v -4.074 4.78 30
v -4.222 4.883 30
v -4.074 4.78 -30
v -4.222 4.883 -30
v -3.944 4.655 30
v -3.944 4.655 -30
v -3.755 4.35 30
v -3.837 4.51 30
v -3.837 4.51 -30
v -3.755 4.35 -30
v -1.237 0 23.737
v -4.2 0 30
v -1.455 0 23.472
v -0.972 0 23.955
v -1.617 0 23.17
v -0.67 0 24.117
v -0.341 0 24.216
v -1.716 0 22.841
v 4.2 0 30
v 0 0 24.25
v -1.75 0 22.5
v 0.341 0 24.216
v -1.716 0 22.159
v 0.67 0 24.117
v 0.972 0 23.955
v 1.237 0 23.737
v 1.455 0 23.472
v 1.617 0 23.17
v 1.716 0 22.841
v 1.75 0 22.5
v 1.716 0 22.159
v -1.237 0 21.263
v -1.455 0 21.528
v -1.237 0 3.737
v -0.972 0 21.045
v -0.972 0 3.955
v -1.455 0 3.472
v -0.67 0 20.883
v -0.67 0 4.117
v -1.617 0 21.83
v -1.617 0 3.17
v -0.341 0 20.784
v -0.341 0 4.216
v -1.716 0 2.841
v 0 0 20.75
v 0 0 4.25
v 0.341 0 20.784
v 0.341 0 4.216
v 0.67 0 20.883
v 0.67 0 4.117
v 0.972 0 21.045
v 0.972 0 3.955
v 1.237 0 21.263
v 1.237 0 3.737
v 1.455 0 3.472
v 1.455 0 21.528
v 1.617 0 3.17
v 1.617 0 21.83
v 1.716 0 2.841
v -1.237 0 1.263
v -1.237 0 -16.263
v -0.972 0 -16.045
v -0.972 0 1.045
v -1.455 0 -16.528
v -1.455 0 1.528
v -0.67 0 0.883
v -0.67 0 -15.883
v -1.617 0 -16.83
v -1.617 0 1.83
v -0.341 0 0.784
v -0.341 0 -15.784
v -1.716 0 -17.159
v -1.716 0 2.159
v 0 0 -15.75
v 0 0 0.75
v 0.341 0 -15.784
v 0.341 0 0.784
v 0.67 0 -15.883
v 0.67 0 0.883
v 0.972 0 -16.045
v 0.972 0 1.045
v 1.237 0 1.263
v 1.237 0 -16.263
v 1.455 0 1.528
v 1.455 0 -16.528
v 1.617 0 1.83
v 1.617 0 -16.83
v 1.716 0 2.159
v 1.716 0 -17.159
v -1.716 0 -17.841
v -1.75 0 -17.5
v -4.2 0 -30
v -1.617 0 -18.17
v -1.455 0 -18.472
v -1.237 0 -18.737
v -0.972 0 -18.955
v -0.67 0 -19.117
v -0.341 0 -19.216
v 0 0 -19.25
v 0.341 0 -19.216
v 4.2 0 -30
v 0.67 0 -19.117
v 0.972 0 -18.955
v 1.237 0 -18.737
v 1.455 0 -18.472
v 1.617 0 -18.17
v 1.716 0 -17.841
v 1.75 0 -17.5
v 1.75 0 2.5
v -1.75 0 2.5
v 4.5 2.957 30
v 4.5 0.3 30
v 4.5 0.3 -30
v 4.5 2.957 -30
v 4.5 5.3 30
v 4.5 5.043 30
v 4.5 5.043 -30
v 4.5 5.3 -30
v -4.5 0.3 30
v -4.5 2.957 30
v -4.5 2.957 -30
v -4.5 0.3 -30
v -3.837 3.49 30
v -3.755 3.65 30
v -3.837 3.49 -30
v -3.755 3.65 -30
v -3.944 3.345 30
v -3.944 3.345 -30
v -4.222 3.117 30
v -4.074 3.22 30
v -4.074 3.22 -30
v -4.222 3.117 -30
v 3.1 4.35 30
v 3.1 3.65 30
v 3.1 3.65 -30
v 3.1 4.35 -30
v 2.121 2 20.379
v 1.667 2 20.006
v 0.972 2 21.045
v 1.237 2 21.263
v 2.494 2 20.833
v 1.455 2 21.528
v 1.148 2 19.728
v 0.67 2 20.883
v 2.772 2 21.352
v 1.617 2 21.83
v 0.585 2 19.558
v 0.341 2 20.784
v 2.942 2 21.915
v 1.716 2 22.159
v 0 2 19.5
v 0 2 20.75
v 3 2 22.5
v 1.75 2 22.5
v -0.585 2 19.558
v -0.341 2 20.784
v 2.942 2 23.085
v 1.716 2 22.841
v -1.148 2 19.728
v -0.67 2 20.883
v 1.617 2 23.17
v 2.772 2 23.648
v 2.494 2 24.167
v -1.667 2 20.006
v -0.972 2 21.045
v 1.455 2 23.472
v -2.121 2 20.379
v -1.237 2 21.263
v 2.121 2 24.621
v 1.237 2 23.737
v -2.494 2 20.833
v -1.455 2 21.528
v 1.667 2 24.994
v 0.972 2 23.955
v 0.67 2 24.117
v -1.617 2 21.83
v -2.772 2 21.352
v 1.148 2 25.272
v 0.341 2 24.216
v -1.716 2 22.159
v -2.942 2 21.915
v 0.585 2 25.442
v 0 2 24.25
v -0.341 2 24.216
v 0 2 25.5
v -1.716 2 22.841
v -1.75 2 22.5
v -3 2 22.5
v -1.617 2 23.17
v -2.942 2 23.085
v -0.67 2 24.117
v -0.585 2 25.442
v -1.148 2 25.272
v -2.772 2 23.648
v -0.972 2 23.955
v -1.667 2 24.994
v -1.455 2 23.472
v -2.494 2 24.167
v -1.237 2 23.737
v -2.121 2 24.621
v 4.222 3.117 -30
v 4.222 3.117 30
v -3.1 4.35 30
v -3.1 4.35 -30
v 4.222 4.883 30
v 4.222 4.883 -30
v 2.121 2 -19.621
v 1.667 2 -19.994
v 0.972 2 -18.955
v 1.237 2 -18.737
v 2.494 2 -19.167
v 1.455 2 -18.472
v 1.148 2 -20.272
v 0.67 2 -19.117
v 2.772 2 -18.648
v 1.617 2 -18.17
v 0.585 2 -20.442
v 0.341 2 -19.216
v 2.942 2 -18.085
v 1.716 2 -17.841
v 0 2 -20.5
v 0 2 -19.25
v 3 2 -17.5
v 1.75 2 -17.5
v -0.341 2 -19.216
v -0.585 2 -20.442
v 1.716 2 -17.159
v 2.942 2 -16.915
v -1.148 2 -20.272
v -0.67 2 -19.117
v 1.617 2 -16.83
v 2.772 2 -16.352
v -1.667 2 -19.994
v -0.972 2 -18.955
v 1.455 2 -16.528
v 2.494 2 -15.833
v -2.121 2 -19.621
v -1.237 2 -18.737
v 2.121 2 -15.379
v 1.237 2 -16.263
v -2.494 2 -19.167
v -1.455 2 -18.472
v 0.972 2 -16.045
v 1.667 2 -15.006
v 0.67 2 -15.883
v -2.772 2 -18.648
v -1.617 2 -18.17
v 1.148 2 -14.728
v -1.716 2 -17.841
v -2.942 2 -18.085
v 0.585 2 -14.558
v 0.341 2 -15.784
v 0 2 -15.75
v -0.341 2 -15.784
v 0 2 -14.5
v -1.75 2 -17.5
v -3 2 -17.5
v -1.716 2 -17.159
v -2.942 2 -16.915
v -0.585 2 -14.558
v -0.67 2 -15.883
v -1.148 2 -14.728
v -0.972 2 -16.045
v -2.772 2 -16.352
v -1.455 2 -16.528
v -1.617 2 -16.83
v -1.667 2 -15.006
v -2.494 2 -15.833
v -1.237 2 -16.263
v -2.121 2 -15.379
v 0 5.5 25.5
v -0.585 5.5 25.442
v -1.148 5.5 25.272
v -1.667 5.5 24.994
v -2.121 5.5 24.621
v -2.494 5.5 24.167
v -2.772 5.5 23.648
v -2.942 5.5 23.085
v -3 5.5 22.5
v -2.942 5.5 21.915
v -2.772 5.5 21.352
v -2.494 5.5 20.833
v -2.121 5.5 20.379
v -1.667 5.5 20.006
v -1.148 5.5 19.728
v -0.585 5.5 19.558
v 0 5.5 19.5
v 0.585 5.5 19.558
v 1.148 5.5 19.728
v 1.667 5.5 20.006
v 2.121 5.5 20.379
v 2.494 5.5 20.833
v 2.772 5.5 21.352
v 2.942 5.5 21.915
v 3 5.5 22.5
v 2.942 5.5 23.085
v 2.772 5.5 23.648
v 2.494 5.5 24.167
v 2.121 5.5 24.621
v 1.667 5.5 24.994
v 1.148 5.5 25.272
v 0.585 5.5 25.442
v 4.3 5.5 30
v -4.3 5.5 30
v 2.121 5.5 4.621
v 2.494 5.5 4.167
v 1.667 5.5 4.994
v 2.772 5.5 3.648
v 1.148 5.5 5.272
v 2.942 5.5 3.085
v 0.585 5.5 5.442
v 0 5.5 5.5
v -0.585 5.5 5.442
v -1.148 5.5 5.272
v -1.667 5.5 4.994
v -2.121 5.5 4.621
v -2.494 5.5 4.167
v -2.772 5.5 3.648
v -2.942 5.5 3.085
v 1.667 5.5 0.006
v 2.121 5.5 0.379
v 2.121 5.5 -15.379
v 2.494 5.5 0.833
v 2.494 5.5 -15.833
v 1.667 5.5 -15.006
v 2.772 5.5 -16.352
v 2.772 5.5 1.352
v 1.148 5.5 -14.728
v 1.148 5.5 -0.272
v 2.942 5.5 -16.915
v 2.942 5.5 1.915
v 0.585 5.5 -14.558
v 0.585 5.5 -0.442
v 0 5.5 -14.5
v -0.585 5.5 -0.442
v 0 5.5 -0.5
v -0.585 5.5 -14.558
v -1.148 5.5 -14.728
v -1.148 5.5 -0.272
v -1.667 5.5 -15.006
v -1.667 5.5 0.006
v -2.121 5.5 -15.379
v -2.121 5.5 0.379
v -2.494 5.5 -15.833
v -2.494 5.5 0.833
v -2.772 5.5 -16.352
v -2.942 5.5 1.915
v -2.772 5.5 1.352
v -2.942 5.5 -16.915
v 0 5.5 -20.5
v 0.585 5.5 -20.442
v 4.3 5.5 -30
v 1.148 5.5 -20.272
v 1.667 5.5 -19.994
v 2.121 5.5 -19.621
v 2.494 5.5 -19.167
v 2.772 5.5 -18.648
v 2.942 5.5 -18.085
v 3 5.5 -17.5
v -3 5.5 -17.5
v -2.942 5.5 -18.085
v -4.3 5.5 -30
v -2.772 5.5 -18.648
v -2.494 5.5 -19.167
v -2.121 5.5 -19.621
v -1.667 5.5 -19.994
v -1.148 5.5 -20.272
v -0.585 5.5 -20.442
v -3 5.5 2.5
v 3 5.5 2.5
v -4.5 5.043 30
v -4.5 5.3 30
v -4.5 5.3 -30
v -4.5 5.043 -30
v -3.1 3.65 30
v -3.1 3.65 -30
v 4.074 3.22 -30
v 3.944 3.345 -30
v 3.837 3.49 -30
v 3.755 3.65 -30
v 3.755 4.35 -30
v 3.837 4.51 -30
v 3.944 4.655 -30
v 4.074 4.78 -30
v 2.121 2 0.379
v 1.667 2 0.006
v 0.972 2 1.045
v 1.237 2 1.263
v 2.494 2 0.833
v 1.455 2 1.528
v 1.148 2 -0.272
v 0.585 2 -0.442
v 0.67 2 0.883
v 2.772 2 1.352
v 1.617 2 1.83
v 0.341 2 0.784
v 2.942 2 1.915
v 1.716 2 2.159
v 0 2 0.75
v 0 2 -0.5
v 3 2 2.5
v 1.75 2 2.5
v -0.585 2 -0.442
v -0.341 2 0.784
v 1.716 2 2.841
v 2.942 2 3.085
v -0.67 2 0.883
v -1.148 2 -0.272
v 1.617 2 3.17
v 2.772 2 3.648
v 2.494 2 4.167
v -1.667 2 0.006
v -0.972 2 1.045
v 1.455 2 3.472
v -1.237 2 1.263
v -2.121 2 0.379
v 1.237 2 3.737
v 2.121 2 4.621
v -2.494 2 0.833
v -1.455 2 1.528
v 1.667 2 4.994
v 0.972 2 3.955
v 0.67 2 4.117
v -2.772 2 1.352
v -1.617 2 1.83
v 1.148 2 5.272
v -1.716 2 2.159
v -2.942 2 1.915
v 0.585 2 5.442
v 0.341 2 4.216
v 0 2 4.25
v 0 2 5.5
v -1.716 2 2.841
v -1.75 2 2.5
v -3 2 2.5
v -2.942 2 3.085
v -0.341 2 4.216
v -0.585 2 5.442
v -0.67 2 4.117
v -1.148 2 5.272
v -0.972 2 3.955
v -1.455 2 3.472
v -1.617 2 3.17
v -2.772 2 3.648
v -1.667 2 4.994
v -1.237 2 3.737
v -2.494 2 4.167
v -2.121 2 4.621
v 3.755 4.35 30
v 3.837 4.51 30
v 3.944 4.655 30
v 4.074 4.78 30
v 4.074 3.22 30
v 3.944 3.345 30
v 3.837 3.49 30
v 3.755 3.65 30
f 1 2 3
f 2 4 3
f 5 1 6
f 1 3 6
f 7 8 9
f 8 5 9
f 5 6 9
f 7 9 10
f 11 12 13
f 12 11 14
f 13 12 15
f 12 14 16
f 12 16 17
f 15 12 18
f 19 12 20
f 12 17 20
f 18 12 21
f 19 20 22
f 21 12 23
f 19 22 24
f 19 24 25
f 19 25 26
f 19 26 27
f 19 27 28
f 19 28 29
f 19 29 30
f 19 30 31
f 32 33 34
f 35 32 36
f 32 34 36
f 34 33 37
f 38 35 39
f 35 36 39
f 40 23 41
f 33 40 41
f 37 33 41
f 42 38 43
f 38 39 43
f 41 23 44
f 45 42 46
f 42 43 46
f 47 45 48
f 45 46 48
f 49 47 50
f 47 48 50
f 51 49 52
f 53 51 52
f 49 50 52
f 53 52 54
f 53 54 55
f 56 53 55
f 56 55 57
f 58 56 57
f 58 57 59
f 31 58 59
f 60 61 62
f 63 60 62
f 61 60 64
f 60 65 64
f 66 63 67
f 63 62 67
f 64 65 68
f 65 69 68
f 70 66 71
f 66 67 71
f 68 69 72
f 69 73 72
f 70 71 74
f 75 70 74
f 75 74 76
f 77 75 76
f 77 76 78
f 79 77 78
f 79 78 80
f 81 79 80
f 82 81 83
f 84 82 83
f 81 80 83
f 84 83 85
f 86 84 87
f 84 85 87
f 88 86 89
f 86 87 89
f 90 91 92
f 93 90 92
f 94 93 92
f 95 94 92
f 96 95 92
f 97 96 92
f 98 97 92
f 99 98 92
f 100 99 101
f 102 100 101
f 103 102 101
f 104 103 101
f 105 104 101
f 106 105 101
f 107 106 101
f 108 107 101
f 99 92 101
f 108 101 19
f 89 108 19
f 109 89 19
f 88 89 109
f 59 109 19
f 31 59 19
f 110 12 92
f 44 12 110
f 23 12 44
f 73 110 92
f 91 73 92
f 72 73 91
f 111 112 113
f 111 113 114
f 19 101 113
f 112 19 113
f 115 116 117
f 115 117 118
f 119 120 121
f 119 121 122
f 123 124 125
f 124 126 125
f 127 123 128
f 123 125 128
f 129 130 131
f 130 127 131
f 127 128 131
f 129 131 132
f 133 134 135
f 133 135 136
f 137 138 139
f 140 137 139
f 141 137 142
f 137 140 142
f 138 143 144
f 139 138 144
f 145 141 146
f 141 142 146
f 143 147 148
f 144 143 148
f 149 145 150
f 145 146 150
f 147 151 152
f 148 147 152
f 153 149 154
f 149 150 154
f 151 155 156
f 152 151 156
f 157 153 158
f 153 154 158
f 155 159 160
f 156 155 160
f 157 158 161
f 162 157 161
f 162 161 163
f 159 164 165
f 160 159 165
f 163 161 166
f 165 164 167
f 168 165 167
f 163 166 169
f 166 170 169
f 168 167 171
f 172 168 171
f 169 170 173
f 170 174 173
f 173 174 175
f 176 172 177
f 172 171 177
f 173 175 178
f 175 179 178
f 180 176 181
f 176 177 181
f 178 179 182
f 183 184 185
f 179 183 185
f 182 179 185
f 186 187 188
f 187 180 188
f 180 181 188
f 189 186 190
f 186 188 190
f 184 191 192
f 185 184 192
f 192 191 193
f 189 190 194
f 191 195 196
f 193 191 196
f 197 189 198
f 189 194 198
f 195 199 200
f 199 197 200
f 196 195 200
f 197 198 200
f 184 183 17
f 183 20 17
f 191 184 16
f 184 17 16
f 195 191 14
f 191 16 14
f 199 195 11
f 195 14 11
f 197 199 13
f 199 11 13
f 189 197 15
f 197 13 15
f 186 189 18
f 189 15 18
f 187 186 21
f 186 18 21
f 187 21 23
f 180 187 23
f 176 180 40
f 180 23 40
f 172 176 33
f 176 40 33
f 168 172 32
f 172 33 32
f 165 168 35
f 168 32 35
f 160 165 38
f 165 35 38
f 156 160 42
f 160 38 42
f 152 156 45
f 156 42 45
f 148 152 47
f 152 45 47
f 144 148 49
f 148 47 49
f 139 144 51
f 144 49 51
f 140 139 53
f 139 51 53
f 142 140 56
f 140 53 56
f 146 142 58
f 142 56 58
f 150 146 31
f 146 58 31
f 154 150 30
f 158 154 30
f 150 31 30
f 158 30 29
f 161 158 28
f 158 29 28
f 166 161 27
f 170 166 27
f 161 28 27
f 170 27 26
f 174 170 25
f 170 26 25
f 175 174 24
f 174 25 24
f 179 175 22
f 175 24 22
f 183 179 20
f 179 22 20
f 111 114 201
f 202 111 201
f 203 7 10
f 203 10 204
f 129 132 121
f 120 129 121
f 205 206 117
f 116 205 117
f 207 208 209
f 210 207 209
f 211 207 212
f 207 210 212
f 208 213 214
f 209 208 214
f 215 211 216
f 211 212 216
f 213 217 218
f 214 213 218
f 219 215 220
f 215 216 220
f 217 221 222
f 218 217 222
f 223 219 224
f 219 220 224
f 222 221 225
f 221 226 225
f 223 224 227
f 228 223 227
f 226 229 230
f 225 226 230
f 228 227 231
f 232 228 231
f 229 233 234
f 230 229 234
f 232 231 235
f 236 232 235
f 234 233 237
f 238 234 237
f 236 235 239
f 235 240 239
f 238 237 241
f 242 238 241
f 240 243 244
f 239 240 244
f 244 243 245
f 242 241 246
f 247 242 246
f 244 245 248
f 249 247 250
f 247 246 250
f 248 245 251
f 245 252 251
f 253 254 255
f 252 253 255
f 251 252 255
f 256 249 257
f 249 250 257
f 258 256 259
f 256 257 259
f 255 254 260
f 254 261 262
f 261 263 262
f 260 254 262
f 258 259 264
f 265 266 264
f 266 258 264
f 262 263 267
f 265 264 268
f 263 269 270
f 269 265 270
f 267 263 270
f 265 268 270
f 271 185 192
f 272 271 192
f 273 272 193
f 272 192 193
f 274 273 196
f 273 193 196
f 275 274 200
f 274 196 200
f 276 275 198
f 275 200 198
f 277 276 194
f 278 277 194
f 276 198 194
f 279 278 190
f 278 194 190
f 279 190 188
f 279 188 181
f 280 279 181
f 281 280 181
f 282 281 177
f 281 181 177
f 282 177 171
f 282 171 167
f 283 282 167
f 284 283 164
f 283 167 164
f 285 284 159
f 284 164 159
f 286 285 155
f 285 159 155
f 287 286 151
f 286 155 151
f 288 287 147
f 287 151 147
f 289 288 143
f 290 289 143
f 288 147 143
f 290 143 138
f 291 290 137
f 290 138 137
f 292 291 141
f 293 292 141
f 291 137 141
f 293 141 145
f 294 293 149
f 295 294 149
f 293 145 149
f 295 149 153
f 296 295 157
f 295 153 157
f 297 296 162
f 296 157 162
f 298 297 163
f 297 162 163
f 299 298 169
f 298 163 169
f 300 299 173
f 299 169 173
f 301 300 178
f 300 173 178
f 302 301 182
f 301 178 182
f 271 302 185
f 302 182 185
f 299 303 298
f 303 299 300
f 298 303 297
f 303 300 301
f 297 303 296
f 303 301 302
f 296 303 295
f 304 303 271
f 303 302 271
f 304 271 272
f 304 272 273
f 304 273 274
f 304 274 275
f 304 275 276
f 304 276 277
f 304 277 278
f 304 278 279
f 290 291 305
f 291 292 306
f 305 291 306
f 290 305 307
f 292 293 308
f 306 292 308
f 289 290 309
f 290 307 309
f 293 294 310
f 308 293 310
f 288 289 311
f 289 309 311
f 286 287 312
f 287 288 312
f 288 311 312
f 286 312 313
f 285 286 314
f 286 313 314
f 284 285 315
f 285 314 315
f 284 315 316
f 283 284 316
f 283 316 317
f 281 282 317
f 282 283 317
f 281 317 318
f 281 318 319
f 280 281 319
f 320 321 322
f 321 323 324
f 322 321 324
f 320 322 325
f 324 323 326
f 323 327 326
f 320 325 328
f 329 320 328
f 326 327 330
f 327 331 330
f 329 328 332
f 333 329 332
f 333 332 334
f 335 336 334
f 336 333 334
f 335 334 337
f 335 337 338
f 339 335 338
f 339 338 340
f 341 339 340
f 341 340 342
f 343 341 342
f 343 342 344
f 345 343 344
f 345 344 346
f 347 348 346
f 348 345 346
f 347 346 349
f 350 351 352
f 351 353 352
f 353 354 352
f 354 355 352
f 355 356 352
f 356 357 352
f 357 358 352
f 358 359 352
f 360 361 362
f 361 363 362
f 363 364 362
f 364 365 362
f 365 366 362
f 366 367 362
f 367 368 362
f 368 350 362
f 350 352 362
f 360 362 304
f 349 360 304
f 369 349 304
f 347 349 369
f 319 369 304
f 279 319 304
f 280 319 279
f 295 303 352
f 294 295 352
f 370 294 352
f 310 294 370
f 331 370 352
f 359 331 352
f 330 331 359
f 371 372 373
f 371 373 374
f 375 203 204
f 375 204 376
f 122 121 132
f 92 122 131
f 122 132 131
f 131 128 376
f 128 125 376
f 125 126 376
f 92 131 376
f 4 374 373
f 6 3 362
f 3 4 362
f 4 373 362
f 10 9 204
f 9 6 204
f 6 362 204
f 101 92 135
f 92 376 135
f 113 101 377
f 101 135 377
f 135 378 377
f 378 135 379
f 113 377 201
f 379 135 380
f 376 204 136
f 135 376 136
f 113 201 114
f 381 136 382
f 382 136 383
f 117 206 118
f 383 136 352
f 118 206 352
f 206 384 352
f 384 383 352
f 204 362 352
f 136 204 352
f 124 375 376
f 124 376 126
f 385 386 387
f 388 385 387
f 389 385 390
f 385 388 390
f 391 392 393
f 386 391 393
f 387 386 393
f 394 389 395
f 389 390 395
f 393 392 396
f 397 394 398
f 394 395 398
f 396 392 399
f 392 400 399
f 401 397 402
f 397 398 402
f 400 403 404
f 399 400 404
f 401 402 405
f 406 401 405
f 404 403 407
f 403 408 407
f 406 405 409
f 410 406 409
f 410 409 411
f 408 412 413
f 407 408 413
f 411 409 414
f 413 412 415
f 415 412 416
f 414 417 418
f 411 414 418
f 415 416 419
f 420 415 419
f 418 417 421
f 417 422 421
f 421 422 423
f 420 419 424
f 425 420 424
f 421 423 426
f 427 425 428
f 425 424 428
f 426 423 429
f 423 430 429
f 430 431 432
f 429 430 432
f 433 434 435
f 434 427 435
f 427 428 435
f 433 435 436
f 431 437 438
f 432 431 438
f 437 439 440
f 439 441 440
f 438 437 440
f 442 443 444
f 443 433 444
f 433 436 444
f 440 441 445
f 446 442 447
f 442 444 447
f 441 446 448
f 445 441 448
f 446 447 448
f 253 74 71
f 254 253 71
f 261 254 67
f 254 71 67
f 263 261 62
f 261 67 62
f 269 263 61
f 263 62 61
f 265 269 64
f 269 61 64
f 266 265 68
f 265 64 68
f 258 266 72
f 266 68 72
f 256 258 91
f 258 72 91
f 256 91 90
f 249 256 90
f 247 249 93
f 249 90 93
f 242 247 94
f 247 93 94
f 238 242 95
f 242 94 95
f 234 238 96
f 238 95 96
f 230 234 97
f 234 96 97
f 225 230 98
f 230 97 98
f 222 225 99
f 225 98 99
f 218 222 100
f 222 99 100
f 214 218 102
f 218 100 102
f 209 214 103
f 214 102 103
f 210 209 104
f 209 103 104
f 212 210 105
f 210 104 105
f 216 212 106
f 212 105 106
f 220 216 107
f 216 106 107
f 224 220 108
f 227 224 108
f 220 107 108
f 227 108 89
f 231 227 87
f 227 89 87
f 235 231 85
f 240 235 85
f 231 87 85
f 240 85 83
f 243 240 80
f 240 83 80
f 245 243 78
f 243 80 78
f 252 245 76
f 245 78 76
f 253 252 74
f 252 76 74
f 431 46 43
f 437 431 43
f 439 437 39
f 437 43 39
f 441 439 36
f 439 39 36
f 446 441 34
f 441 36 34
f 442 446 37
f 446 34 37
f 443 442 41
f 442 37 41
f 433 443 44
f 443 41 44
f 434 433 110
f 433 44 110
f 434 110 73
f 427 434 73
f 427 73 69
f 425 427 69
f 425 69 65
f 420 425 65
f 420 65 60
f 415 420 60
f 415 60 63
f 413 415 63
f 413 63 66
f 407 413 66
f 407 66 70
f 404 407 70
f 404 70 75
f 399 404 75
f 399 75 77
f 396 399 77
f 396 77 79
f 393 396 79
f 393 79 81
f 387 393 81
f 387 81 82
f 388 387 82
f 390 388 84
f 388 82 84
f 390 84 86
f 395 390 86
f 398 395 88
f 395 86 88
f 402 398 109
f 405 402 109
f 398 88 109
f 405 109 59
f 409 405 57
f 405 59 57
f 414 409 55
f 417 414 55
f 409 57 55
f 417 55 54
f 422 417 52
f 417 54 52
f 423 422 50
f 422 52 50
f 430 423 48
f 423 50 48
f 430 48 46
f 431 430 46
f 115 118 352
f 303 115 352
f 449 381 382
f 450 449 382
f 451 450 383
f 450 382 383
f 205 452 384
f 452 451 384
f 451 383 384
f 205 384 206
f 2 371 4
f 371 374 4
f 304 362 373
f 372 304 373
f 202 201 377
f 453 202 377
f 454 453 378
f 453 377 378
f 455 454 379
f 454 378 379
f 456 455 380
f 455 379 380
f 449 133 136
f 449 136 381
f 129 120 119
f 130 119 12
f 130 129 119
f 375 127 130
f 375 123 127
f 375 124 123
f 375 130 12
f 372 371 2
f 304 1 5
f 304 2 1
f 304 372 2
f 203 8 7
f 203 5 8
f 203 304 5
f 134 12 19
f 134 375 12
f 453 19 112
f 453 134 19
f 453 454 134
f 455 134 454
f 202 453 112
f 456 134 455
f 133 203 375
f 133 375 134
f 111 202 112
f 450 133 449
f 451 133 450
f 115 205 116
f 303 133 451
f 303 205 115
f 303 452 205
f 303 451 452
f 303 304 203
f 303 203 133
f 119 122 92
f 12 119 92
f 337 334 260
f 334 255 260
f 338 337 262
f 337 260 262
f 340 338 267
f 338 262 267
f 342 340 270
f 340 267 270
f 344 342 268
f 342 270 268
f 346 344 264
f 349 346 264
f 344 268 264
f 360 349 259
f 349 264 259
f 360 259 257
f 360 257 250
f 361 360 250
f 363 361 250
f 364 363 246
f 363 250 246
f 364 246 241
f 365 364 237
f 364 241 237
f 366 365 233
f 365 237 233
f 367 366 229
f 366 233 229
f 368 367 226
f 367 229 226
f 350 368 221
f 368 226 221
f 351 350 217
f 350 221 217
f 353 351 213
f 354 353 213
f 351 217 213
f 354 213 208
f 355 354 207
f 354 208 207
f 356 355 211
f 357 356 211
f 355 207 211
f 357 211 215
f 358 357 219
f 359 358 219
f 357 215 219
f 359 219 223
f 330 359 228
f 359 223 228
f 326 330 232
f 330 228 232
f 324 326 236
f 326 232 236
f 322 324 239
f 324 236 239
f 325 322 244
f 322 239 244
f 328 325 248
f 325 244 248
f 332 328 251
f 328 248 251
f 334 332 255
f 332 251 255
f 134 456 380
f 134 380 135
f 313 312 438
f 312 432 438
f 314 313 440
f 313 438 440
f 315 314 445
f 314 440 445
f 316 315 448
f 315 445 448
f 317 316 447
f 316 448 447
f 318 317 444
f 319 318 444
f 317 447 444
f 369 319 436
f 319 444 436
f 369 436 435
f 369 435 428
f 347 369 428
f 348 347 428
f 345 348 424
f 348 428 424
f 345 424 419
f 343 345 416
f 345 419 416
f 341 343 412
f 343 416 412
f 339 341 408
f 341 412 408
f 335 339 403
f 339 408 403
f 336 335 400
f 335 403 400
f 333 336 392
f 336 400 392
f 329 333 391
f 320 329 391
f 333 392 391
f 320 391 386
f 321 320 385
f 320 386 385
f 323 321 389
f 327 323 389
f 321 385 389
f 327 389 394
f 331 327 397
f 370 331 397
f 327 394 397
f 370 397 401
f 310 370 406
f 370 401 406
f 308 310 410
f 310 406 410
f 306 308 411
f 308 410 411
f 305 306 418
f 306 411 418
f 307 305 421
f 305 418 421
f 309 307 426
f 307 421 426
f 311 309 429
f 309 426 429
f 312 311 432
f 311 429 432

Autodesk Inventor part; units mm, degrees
sketch "Sketch_12" plane through (0, 0, 0) normal (0, 0, 1) x (1, 0, 0)
  line L0 (-4.5, 5.3) -> (-4.5, 5.0434)
  line L1 (-4.5, 5.0434) -> (-4.2216, 4.8827)
  arc A0 (-3.7548, 4.35) -> (-4.2216, 4.8827) centre (-4.7715, 3.93) ccw
  line L2 (-3.7548, 4.35) -> (-3.1, 4.35)
  line L3 (-3.1, 4.35) -> (-3.1, 3.65)
  line L4 (-3.1, 3.65) -> (-3.7548, 3.65)
  arc A1 (-4.2216, 3.1173) -> (-3.7548, 3.65) centre (-4.7715, 4.07) ccw
  line L5 (-4.2216, 3.1173) -> (-4.5, 2.9566)
  line L6 (-4.5, 2.9566) -> (-4.5, 0.3)
  line L7 (-4.5, 0.3) -> (-4.2, 0)
  line L8 (-4.2, 0) -> (4.2, 0)
  line L9 (4.2, 0) -> (4.5, 0.3)
  line L10 (4.5, 0.3) -> (4.5, 2.9566)
  line L11 (4.5, 2.9566) -> (4.2216, 3.1173)
  arc A2 (3.7548, 3.65) -> (4.2216, 3.1173) centre (4.7715, 4.07) ccw
  line L12 (3.7548, 3.65) -> (3.1, 3.65)
  line L13 (3.1, 3.65) -> (3.1, 4.35)
  line L14 (3.1, 4.35) -> (3.7548, 4.35)
  arc A3 (4.2216, 4.8827) -> (3.7548, 4.35) centre (4.7715, 3.93) ccw
  line L15 (4.2216, 4.8827) -> (4.5, 5.0434)
  line L16 (4.5, 5.0434) -> (4.5, 5.3)
  line L17 (4.5, 5.3) -> (4.3, 5.5)
  line L18 (4.3, 5.5) -> (-4.3, 5.5)
  line L19 (-4.3, 5.5) -> (-4.5, 5.3)
extrude "Extrusion1" add sketch "Sketch_12" along normal mid plane 60
sketch "Sketch2" plane through (-4.3, 5.5, 30) normal (0, 1, 0) x (1, 0, 0)
  point P0 (4.3, 447.5)
hole "Hole1" at (0, 5.5, -417.5) direction (0, -1, 0) diameter 3.5 depth 5.5 counterbore diameter 6 counterbore depth 3.5
pattern_linear "Rectangular Pattern1" count 23 spacing 20 along (0, 0, 1) of "Hole1"
ref_plane "rail_to_adjusting_block_XY" through (0, 0, -220) normal (0, 1, 0) x (1, 0, 0)
ref_plane "rail_to_adjusting_block_YZ" through (0, 0, -220) normal (1, 0, 0) x (0, 0, -1)
ref_plane "rail_to_adjusting_block_ZX" through (0, 0, -220) normal (0, 0, -1) x (0, 1, 0)
ref_plane "to_block_XY" through (0, 5.5, 113.75) normal (0, 0, 1) x (1, 0, 0)
ref_plane "to_block_YZ" through (0, 5.5, 113.75) normal (1, 0, 0) x (0, 1, 0)
ref_plane "to_block_ZX" through (0, 5.5, 113.75) normal (0, 1, 0) x (0, 0, 1)
ref_plane "to_block_2_XY" through (0, 5.5, -113.75) normal (0, 0, 1) x (1, 0, 0)
ref_plane "to_block_2_YZ" through (0, 5.5, -113.75) normal (1, 0, 0) x (0, 1, 0)
ref_plane "to_block_2_ZX" through (0, 5.5, -113.75) normal (0, 1, 0) x (0, 0, 1)
ref_plane "to_kue_XY" through (0, 0, 0) normal (0, 1, 0) x (1, 0, 0)
ref_plane "to_kue_YZ" through (0, 0, 0) normal (1, 0, 0) x (0, 0, -1)
ref_plane "to_kue_ZX" through (0, 0, 0) normal (0, 0, -1) x (0, 1, 0)
properties part number "SSE2B-MX10-455_r" material "ステンレス鋼"
